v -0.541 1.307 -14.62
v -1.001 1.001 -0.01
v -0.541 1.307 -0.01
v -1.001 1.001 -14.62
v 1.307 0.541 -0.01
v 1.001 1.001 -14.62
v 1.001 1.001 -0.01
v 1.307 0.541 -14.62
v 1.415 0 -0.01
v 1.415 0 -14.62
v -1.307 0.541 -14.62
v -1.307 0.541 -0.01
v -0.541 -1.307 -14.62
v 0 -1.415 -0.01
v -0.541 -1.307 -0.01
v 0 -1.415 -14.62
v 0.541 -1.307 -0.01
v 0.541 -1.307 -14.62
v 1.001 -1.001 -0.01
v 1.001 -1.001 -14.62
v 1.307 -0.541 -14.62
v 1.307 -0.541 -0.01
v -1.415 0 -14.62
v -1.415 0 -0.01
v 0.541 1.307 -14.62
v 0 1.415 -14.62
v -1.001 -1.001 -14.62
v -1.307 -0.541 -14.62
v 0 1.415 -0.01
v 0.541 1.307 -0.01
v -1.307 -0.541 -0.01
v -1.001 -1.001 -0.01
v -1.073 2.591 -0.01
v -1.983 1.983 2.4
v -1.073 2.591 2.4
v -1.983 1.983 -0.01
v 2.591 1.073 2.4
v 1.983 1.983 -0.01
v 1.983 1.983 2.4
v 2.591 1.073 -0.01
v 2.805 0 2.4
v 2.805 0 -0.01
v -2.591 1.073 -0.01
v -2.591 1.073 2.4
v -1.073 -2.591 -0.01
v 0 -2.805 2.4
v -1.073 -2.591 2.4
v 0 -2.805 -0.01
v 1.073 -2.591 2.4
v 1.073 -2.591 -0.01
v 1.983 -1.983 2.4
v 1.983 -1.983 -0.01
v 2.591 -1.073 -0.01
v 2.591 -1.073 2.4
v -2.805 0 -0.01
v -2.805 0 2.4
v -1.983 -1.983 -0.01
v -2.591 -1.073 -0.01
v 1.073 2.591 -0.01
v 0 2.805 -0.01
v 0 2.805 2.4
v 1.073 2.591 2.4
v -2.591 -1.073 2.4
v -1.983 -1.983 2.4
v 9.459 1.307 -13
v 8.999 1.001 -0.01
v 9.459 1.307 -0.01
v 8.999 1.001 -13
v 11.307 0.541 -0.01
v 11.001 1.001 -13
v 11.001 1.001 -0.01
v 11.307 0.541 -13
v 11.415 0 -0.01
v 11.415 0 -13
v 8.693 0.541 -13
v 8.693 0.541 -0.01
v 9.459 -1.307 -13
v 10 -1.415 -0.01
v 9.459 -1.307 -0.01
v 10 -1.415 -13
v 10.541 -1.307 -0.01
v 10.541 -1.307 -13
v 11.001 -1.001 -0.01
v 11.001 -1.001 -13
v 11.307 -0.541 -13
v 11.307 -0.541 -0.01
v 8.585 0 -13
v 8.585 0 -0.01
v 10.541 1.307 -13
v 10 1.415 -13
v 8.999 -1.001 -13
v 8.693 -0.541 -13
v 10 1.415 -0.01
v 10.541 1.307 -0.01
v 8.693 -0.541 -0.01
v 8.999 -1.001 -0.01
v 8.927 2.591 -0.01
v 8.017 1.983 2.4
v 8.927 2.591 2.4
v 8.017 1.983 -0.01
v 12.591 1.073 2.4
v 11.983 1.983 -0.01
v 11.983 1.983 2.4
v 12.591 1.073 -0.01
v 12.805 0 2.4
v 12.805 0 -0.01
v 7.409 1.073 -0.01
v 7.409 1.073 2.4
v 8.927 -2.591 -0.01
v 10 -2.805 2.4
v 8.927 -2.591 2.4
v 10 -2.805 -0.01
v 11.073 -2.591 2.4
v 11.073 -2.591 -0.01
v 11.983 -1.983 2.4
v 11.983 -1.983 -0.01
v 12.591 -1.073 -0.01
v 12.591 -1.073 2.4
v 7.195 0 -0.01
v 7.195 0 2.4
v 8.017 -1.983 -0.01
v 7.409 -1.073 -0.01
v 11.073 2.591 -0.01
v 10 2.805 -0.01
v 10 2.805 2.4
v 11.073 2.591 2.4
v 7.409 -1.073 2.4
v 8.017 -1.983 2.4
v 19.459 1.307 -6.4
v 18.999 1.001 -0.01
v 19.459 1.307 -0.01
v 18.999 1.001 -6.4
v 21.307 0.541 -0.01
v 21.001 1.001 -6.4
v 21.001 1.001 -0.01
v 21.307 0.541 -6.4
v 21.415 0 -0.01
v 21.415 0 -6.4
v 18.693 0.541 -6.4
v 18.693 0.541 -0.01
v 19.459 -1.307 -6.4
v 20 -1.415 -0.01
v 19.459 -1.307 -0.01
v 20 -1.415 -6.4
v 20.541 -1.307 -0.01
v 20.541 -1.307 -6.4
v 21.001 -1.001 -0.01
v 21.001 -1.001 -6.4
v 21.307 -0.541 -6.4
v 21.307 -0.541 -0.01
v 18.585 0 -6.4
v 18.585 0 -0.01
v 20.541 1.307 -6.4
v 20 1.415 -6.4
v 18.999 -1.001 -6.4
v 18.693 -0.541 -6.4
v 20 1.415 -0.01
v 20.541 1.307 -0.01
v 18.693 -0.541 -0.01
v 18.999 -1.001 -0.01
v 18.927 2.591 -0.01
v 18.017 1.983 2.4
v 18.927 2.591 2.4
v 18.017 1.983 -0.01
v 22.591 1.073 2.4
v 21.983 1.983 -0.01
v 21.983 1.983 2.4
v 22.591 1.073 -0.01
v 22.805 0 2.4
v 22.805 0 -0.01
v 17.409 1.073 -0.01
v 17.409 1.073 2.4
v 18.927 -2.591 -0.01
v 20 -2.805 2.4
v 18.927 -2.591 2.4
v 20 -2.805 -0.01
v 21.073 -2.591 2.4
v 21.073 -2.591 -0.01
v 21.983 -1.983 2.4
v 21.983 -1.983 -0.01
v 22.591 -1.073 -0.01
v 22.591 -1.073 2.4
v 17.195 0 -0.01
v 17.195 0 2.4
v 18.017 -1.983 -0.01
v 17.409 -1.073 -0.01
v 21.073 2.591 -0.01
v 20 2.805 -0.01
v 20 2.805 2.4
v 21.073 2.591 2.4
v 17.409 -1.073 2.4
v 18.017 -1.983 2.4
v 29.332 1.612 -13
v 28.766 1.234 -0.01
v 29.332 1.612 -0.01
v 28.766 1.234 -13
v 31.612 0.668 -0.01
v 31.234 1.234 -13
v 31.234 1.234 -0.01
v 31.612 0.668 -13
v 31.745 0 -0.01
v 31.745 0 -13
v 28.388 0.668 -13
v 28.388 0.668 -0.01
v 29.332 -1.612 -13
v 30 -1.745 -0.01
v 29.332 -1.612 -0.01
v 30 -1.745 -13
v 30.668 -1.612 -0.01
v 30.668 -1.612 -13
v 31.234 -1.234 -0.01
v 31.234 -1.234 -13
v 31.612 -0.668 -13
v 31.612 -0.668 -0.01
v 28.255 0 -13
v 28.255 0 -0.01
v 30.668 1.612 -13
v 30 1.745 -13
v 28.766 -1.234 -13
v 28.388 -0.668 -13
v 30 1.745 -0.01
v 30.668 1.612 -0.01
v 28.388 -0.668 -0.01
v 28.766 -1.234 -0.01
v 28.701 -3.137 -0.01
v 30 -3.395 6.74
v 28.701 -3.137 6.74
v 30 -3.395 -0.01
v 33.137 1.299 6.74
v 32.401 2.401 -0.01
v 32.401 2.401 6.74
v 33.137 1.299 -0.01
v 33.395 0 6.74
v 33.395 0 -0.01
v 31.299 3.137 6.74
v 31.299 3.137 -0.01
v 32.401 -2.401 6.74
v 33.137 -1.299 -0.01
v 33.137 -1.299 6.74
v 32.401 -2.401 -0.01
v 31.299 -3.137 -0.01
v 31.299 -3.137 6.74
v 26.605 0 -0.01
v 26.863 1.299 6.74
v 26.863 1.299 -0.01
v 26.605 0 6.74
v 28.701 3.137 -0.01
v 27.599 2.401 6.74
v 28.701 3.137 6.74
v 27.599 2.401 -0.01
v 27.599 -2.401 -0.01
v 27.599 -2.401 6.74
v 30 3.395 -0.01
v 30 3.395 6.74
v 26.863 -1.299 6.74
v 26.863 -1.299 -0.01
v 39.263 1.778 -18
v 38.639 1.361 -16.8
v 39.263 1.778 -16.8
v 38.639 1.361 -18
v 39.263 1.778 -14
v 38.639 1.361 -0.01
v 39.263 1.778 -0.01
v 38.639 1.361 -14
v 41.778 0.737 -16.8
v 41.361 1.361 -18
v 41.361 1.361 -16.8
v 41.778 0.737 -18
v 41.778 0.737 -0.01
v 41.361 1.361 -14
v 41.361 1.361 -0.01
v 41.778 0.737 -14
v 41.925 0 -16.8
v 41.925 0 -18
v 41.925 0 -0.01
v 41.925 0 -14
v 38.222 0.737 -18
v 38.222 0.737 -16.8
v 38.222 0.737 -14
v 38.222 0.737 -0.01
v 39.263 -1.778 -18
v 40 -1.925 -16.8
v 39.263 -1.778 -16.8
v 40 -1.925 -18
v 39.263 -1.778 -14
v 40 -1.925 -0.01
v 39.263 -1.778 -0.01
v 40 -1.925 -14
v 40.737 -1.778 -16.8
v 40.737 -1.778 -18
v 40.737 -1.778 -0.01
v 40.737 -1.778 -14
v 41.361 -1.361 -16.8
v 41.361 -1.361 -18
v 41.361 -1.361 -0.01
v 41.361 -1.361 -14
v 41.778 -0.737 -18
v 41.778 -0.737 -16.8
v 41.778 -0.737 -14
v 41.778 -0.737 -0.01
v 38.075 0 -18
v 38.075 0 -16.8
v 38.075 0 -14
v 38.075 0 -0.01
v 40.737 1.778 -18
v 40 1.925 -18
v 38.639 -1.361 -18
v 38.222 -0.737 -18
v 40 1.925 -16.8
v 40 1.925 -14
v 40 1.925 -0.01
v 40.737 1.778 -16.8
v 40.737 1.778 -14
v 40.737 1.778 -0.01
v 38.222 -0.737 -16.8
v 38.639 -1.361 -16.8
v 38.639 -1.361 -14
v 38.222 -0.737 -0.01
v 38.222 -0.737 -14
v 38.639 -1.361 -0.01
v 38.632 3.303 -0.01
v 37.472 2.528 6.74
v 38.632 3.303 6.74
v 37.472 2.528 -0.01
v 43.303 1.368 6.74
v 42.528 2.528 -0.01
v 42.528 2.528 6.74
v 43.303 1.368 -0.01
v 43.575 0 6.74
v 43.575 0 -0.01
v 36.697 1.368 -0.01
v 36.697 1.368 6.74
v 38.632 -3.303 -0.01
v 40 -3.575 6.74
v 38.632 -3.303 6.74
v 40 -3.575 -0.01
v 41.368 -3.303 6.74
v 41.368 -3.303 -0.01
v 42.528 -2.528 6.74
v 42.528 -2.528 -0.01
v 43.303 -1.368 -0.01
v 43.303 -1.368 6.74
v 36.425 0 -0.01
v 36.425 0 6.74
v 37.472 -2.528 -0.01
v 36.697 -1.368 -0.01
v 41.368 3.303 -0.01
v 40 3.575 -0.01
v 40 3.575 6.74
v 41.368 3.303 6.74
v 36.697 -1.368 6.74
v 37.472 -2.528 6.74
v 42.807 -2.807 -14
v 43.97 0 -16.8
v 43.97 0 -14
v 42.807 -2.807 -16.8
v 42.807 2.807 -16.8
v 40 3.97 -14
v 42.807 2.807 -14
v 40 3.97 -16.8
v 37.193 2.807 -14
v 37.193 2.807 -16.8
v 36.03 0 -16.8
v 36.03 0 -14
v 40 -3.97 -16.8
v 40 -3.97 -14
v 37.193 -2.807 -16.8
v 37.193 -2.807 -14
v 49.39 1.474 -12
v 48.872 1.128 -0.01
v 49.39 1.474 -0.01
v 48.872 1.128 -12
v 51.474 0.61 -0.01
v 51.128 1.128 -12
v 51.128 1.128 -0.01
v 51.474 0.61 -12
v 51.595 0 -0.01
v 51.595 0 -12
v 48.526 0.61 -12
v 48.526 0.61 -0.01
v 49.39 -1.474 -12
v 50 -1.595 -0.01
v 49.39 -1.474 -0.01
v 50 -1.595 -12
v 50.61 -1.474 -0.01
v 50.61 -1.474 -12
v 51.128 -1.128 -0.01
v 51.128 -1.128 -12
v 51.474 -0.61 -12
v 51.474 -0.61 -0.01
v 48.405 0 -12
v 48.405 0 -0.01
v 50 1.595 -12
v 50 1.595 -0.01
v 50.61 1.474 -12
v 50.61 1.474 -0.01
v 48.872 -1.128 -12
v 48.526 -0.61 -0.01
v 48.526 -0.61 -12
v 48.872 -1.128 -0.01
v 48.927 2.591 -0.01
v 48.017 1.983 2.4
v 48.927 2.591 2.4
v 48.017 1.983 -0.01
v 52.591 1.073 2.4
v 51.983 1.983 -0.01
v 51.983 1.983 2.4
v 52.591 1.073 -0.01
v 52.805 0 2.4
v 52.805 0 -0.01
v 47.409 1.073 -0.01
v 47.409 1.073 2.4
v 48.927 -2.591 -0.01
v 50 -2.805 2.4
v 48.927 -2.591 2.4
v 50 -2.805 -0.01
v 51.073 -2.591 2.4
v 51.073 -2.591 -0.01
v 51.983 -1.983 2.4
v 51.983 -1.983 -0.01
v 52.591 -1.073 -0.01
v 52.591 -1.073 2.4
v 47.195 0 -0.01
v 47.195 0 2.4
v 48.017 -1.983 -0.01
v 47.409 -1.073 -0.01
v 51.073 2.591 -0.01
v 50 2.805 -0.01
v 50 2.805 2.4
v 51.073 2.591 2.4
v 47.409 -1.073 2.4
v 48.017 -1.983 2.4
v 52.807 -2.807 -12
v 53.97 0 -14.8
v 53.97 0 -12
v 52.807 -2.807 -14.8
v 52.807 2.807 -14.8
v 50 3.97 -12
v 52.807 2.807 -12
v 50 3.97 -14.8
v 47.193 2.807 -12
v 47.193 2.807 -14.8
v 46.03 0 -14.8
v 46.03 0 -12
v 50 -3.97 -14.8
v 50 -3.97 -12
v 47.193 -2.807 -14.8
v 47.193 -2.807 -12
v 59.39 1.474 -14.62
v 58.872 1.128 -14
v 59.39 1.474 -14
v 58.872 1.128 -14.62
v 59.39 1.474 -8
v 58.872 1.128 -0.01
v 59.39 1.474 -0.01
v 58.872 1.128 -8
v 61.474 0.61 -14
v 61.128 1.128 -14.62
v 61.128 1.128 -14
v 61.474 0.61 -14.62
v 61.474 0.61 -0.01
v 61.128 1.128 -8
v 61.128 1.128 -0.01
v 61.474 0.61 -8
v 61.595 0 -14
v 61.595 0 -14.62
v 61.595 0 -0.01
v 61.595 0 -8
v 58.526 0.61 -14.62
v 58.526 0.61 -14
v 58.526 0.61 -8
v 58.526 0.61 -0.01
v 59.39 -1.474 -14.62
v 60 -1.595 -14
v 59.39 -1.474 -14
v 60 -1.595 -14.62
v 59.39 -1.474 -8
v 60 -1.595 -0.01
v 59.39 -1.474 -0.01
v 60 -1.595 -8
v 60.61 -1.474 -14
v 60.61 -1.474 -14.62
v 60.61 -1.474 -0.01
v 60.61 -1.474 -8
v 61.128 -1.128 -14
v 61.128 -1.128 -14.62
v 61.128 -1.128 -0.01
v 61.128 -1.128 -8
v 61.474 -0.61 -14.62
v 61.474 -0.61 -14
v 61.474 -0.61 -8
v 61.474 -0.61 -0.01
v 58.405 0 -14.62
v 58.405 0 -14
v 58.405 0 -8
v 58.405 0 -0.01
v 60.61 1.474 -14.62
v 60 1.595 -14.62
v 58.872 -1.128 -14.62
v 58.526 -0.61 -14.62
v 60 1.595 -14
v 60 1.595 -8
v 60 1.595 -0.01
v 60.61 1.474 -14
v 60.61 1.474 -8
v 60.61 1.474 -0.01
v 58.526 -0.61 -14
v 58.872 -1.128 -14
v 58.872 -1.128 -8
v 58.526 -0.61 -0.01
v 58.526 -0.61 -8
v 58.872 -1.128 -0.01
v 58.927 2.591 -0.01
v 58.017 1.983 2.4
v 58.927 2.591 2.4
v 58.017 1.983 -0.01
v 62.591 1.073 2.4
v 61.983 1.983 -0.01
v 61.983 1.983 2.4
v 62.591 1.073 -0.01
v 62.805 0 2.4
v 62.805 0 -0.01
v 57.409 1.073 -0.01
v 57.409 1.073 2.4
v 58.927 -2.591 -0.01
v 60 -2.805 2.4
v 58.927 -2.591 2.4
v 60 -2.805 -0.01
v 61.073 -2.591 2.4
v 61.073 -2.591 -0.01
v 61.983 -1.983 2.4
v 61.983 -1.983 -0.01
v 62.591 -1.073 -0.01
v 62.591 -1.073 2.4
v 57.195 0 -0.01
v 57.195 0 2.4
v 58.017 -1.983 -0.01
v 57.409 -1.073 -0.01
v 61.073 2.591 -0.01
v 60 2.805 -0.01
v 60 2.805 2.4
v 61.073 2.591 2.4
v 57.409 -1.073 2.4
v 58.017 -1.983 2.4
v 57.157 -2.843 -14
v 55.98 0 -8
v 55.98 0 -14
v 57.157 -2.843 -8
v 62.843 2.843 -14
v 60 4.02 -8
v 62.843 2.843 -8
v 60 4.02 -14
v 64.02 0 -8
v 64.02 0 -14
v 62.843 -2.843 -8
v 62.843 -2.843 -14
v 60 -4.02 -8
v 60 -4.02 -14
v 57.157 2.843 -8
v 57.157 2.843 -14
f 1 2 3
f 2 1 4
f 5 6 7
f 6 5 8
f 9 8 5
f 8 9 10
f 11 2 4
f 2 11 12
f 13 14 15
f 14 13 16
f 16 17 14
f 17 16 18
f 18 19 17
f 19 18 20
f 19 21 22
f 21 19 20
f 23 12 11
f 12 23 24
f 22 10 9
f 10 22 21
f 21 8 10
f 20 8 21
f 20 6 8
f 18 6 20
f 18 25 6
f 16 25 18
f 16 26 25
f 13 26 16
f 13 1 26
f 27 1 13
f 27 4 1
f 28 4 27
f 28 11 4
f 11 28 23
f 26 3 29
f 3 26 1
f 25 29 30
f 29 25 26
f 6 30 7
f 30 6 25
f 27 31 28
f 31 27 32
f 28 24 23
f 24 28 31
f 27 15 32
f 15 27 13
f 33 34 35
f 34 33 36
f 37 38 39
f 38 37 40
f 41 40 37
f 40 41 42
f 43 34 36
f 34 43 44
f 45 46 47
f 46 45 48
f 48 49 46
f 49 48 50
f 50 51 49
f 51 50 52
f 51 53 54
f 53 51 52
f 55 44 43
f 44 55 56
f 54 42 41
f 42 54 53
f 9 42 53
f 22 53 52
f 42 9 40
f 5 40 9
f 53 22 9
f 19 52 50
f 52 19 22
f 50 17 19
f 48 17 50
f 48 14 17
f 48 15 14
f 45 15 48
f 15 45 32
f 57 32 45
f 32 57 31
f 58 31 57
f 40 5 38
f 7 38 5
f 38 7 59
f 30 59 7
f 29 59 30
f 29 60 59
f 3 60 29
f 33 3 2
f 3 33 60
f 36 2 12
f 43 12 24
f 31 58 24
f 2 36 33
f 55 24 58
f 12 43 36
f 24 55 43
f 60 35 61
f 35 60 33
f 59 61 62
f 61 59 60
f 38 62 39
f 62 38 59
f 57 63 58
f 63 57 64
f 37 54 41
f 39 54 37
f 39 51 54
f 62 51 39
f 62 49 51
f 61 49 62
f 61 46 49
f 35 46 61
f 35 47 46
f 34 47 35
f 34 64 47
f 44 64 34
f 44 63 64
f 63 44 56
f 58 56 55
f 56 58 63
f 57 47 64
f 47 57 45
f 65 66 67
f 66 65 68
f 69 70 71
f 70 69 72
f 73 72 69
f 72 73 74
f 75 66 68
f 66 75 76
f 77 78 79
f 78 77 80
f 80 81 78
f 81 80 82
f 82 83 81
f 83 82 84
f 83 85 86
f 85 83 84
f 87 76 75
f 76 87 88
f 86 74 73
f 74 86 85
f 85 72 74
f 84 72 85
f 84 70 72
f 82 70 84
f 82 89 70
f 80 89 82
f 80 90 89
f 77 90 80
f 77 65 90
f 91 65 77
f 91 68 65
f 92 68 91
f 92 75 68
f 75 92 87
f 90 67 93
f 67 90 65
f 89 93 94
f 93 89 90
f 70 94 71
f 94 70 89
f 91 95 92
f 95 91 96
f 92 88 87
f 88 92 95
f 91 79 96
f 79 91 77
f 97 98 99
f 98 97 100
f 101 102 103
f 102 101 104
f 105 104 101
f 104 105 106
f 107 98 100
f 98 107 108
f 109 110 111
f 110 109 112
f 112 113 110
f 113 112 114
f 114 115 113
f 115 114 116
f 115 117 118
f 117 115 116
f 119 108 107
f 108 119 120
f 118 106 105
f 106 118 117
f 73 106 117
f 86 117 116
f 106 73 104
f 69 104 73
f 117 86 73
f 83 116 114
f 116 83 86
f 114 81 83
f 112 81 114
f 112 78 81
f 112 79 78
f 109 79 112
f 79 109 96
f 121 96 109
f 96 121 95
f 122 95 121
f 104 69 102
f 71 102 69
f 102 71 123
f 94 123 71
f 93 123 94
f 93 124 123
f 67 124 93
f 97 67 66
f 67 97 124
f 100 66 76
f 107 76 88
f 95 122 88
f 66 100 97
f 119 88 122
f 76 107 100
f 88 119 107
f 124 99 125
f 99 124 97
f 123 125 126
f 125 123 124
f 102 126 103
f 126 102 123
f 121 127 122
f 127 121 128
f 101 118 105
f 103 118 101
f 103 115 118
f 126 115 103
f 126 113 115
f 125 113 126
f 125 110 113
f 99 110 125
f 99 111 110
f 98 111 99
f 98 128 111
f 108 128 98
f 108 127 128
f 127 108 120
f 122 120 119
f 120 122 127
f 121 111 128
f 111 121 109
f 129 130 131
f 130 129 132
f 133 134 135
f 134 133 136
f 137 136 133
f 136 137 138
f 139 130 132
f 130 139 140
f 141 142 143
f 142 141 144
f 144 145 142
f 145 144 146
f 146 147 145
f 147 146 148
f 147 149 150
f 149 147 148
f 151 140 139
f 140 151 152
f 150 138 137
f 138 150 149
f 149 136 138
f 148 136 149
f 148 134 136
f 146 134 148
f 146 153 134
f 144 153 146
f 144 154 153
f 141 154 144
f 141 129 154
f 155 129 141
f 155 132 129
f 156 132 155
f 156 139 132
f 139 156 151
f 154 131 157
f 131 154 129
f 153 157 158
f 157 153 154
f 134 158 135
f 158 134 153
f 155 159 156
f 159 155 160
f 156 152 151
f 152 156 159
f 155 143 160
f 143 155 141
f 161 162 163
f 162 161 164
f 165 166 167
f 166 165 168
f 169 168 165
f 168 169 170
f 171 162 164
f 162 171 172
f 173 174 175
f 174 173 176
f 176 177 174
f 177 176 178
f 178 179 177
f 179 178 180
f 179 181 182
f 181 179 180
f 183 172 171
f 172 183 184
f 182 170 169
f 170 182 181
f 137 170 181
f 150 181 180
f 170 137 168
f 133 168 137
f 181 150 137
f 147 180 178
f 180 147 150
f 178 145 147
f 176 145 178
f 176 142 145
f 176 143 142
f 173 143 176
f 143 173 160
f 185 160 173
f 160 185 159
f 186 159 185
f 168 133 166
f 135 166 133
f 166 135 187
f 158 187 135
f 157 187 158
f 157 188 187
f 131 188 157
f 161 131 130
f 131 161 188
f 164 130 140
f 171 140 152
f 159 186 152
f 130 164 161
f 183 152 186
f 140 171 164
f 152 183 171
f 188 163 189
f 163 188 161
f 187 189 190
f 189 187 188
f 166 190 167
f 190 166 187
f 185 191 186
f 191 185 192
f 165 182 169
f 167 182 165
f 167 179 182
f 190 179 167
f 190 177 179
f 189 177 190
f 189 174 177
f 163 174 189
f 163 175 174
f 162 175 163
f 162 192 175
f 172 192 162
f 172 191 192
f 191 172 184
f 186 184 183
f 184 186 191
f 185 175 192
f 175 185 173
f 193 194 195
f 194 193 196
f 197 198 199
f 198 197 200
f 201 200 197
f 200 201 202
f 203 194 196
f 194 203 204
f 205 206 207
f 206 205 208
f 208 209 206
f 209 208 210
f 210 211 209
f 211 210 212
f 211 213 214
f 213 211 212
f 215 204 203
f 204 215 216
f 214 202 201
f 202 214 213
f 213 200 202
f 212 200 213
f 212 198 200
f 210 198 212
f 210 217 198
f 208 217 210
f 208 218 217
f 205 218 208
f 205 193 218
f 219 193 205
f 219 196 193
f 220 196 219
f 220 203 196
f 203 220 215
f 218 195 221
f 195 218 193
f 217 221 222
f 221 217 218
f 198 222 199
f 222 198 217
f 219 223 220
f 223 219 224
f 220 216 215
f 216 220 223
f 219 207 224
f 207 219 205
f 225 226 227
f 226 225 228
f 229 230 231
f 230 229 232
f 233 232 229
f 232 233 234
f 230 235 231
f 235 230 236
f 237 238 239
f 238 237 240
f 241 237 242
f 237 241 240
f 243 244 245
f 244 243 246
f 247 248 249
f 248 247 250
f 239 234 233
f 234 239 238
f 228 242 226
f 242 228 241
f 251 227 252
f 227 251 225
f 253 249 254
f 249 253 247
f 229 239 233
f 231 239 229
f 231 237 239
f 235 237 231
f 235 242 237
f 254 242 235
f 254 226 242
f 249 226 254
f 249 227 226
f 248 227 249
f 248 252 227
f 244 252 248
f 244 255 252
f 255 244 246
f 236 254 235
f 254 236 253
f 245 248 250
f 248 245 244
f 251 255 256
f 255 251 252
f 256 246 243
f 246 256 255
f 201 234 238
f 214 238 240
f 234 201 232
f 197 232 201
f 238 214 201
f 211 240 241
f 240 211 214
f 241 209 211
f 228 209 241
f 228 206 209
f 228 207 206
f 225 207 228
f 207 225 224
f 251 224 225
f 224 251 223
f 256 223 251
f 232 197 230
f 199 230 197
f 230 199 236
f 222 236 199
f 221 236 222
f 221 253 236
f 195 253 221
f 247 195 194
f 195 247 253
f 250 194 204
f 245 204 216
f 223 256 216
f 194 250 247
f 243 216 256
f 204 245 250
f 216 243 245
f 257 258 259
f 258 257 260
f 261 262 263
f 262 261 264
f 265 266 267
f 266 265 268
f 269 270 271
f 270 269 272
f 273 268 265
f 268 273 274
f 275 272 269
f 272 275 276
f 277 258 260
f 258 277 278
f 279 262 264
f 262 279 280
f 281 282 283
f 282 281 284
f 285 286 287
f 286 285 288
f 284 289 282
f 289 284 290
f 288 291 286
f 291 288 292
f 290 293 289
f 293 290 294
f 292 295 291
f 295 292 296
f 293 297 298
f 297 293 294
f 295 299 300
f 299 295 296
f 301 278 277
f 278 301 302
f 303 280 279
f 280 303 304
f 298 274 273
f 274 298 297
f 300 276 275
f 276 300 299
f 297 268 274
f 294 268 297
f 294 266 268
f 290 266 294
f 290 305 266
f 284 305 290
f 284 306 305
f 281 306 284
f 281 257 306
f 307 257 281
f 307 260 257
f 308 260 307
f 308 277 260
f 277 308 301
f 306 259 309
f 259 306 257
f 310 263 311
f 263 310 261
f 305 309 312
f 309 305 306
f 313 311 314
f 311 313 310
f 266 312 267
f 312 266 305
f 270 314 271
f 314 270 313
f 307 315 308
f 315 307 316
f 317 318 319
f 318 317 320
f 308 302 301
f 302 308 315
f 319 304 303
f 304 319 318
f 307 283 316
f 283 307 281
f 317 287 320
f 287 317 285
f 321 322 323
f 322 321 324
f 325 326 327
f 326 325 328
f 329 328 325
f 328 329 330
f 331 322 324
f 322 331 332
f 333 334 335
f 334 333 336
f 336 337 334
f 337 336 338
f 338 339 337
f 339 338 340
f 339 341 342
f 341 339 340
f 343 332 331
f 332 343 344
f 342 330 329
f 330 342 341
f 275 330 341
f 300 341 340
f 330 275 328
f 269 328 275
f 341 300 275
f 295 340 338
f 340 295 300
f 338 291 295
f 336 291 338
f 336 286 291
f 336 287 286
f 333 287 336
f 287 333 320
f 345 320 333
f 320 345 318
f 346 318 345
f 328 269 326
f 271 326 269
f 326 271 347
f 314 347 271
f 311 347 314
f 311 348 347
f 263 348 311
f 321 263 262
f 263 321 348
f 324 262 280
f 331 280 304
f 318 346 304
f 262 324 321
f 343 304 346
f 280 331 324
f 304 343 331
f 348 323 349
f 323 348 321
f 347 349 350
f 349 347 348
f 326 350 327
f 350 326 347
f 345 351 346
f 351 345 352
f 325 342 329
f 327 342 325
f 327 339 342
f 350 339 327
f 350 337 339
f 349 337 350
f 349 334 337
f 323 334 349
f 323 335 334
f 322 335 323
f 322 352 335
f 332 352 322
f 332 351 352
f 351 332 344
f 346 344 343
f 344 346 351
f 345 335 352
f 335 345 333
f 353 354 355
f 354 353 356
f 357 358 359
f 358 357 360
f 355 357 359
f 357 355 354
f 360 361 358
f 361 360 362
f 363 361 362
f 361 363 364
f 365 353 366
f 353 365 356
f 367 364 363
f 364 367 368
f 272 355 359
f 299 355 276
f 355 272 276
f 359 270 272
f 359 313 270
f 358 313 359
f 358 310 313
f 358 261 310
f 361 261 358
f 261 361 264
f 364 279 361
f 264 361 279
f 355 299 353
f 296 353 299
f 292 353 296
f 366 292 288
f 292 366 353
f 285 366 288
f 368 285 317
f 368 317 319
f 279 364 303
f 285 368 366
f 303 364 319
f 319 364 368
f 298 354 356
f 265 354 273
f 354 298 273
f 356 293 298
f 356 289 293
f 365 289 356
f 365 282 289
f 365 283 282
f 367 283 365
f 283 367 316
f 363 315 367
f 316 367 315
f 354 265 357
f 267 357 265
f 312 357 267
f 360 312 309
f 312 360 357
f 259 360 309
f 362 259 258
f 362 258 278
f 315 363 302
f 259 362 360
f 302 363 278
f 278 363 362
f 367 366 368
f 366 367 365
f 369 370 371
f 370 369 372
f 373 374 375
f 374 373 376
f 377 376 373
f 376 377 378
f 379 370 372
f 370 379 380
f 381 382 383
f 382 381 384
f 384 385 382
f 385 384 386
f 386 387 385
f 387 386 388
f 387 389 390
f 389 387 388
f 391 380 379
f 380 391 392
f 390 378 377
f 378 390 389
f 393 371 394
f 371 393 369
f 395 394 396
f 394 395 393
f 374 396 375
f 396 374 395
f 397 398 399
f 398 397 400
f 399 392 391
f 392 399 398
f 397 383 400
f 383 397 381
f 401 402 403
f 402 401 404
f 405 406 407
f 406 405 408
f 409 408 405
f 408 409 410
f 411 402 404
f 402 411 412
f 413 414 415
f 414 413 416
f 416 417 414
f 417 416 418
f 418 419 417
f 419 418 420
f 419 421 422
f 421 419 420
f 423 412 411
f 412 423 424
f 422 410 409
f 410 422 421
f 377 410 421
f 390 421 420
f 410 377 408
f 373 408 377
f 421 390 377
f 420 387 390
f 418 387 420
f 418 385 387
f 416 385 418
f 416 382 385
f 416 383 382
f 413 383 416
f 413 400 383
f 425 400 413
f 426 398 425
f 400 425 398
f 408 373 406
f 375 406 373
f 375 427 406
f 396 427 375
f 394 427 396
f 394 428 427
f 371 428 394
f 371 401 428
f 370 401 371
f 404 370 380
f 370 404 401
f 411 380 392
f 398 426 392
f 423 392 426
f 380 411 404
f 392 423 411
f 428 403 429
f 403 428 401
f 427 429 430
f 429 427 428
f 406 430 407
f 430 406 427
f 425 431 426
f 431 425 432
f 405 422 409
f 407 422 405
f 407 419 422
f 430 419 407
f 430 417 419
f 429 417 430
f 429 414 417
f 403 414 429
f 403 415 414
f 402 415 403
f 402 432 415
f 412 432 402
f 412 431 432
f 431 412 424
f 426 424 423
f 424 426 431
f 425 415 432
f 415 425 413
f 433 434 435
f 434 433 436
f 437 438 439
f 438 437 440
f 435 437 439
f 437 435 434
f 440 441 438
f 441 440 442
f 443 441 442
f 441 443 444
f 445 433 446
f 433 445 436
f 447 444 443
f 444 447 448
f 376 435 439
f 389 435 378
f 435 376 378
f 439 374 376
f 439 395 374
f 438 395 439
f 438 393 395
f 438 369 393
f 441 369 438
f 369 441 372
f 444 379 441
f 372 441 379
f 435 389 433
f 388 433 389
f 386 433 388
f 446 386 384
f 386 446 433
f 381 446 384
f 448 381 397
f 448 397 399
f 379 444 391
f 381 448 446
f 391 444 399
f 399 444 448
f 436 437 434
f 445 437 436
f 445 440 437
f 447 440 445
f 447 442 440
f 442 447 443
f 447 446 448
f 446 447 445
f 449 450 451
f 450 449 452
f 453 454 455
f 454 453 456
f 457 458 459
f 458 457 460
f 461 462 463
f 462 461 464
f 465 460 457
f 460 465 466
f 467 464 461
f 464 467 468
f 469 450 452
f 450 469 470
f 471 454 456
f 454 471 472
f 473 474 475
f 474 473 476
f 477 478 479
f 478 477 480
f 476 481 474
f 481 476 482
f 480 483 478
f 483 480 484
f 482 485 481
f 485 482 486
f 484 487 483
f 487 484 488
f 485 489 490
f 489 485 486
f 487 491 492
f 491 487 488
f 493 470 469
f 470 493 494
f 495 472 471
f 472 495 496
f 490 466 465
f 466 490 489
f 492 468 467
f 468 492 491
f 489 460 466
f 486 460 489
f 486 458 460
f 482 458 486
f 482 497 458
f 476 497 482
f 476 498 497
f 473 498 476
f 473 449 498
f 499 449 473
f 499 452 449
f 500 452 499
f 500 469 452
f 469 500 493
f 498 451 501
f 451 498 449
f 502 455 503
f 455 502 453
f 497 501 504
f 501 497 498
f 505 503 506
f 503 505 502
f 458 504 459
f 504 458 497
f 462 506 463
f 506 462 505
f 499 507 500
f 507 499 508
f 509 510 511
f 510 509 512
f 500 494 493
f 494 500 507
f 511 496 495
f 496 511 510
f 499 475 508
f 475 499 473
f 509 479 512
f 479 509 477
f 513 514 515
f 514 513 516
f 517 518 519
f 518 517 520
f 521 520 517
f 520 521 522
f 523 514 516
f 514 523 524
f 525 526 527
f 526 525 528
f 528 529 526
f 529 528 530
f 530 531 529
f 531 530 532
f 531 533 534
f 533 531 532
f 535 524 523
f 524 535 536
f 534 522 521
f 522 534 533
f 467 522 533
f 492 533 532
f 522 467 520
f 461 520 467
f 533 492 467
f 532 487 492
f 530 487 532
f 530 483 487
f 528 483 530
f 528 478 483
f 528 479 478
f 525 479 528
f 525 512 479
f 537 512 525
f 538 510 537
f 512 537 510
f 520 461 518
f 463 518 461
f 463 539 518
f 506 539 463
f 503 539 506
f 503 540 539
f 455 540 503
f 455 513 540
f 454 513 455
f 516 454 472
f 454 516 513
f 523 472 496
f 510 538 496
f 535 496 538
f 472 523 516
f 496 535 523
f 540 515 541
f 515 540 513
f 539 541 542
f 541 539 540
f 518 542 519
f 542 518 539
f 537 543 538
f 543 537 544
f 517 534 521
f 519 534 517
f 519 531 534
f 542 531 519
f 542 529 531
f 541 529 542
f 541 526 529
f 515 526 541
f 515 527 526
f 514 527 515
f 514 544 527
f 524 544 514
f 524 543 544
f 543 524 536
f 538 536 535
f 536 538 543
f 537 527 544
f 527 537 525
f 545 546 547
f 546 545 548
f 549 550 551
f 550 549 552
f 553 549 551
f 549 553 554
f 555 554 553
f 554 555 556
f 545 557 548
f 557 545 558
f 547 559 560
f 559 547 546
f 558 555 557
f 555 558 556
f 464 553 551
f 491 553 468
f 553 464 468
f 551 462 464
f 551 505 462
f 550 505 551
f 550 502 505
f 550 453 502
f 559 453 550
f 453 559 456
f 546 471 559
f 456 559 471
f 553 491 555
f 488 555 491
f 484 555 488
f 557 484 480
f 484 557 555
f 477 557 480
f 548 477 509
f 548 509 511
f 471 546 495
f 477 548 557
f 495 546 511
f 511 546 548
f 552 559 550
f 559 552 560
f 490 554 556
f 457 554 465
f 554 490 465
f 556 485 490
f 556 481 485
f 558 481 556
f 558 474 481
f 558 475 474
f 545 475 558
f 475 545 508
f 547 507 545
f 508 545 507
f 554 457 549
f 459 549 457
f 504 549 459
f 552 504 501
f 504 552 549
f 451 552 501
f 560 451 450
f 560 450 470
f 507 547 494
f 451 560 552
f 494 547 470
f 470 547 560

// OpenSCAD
// We distinguish between:
// - Screws - which do not have a nut
// - Bolts - which have a nut or an insert (heat installed)
//    (These are naming conventions only.)
// Each object describes a negative volume. So needs to be a bit larger than actual object.

// Screw factors:
// Screw tolerance:
// - all measured dimensions of circles will shrink by an amount when printed.
//   screws need to bite into the plastic. Bolts need to go through cleanly.
//   This accounts for that difference.
/* [Parameters] */
screw_thread_tol = 0.04;  // for screws smaller than bolts which need more space
bolt_thread_tol = 0.4;    // for bolts (larger so clean fit)
screw_res = 16;   // for a printer this is probably enough
thread_res = 25;  // for a printer this is probably enough
nut_res = 8;      // assuming all nuts are trad 8 sided

Show_screws = true;
// print Block
Clearance_testing = false;
show_cutaway = true;
/* [Hidden] */
Delta = 0.01;  // tiny overlaps for better viewer display


// Screws:


// 4-40 pan head  machine screws
// - M3 should also work where these are used (but check length)
module screw_4_40_A(extra_cap=0 ,extra_length=0) {
    // 3/4in long - 14.5mm long 2.79mm wide, pan head
    thread_dia = 2.79;
    thread_height = 14.62;
    head_dia = 5.21;
    head_height = 2.41;
    //
    screw(thread_dia+screw_thread_tol, thread_height+extra_length,
          head_dia+bolt_thread_tol, head_height+extra_cap);
}

// 4-40 but shorter 1/2in
module screw_4_40_B(extra_cap=0 ,extra_length=0) {
    // 1/2in long - 13mm long 2.79mm wide, pan head
    thread_dia = 2.79;
    thread_height = 13.0;
    head_dia = 5.21;
    head_height = 2.41;
    //
    screw(thread_dia+screw_thread_tol, thread_height+extra_length,
          head_dia+bolt_thread_tol, head_height+extra_cap);
}

// 4-40 but shorter 1/4in
module screw_4_40_C(extra_cap=0 ,extra_length=0) {
    // 1/2in long - 6.5mm long 2.79mm wide, pan head
    thread_dia = 2.79;
    thread_height = 6.4;
    head_dia = 5.21;
    head_height = 2.41;
    //
    screw(thread_dia+screw_thread_tol, thread_height+extra_length,
          head_dia+bolt_thread_tol, head_height+extra_cap);
}


// 6-32 pan head machine screws
module screw_6_32_A(extra_cap=0 ,extra_length=0) {
    // 1/2 long - 13mm long 3.34mm wide, pan head
    thread_dia = 3.45;
    thread_height = 13;
    head_dia = 6.75;
    head_height = 6.75;
    //
    screw(thread_dia+screw_thread_tol, thread_height+extra_length,
          head_dia+screw_thread_tol, head_height+extra_cap);
}




// Other Screw/Bolt/Insert Examples:

// Bolt version of screw
module bolt_6_32_B(nut_dist=10, extra_cap=0 ,extra_length=0) {
    // 5/8 long - 18mm long 3.34mm wide, pan head with Nut (8mm)
    thread_dia = 3.45;
    thread_height = 18;
    head_dia = 6.75;
    head_height = 6.75;
    nut_width = 7.9;
    nut_height = 2.8;
    //
    screw(thread_dia+bolt_thread_tol, thread_height+extra_length,
          head_dia+bolt_thread_tol, head_height+extra_cap,
          nut_width+screw_thread_tol, nut_height+extra_cap, nut_dist);
}

module bolt_4_40_A(nut_dist=10, extra_cap=0 ,extra_length=0) {
    // 1/2 long - 14.5mm long 2.79mm wide, hex head with nut
    thread_dia = 2.79;
    thread_height = 14.62;
    head_dia = 5.21;
    head_height = 2.41;
    nut_width = 7.9;
    nut_height = 2.8;
    //
    screw(thread_dia+bolt_thread_tol, thread_height+extra_length,
          head_dia+bolt_thread_tol, head_height+extra_cap,
          nut_width+screw_thread_tol, nut_height+extra_cap, nut_dist);
}

// M3 bolt with nut
module bolt_M3_A(nut_dist=10, extra_cap=0 ,extra_length=0) {
    bolt_4_40_A(nut_dist, extra_cap, extra_length);
}
// M3 with Insert instead of Nut
module bolt_M3_B(nut_dist=6, extra_cap=0 ,extra_length=0) {
    // 14.5mm long 2.79mm wide, Insert
    thread_dia = 2.79;
    thread_height = 14.62;
    head_dia = 5.21;
    head_height = 2.41;
    nut_width = 8;
    nut_height = 6;
    //
    screw(thread_dia+bolt_thread_tol, thread_height+extra_length,
          head_dia+bolt_thread_tol, head_height+extra_cap,
          nut_width+screw_thread_tol, nut_height+extra_cap, nut_dist);
}


module screw(dia, length, head_dia, head_height, nut_width=0, nut_height=0, nut_dist=0) {
    //
    translate([0, 0, -length/2])
        cylinder(h=length, d=dia, center=true, $fn=screw_res); 
    translate([0,0,head_height/2-Delta]) 
        cylinder(h=head_height, d=head_dia, center=true, $fn=screw_res);
    // do we have a nut/insert?
    if (nut_width != 0) {
        // expecting to find the three nut values
        translate([0, 0, -nut_height/2-nut_dist])
            cylinder(h=nut_height, d=nut_width, center=true, $fn=nut_res); 
    }
}



// Testing
module test_screws() {
    translate([0,0,0]) {
        screw_4_40_A();
        rotate([0,0,90])
        translate([10,-2,0])
            text("4-40 x 3/4in machine screw (14.5mm long 2.79mm wide), pan head",size=4);
    }

    translate([10,0,0]) {
        screw_4_40_B();
        rotate([0,0,90])
        translate([10,-2,0])
            text("4-40 x 1/2in machine screw (13mm long 2.79mm wide), pan head",size=4);
    }

    translate([20,0,0]) {
        screw_4_40_C();
        rotate([0,0,90])
        translate([10,-2,0])
            text("4-40 x 1/4in machine bolt (6.5mm long 2.79mm wide), pan head",size=4);
    }

    translate([30,0,0]) {
        screw_6_32_A();
        rotate([0,0,90])
        translate([10,-2,0])
            text("6/32 x 1/2in screw (13mm long 3.34mm wide), pan head",size=4);
    }

    translate([40,0,0]) {
        bolt_6_32_B(14);
        rotate([0,0,90])
        translate([10,-2,0])
            text("6/32 5/8in bolt (18mm long 3.34mm wide), pan head w/nut",size=4);
    }

    translate([50,0.0]) {
        bolt_M3_A(nut_dist=12);
        rotate([0,0,90])
        translate([10,-2,0])
            text("M3 bolt 15mm long 3mm wide, hex head w/nut",size=4);
    }
    translate([60,0.0]) {
        bolt_M3_B(nut_dist=8);
        rotate([0,0,90])
        translate([10,-2,0])
            text("M3 bolt 15mm long 3mm wide, hex head w/insert",size=4);
    }
}

// Testing
module test_screw_block() {
	block_length = 90;
    difference() {
        translate([-10,10,-15])
            cube([block_length,10,16]);  // length of the test block
        translate([0,15,0.1])
            test_screws();
        }
}

//
if (Show_screws)
    test_screws();

if (Clearance_testing)
    if (show_cutaway)
        translate([0,-50,0])
        difference() {
            test_screw_block();
            color("red")
            translate([-11,5,-18])
                cube([170,10,20]);
        }
    else
        translate([0,-50,0])
            test_screw_block();

color("Red")
translate([-30,0,0])
rotate([0,0,90]) {
    text("Dynamic edits to screw parameters will", size=4);
    translate([0,-8,0])
        text("need to be manually transferred to the file", size=4);
    translate([0,-16,0])
        text("for correct part printing.", size=4);
    }
